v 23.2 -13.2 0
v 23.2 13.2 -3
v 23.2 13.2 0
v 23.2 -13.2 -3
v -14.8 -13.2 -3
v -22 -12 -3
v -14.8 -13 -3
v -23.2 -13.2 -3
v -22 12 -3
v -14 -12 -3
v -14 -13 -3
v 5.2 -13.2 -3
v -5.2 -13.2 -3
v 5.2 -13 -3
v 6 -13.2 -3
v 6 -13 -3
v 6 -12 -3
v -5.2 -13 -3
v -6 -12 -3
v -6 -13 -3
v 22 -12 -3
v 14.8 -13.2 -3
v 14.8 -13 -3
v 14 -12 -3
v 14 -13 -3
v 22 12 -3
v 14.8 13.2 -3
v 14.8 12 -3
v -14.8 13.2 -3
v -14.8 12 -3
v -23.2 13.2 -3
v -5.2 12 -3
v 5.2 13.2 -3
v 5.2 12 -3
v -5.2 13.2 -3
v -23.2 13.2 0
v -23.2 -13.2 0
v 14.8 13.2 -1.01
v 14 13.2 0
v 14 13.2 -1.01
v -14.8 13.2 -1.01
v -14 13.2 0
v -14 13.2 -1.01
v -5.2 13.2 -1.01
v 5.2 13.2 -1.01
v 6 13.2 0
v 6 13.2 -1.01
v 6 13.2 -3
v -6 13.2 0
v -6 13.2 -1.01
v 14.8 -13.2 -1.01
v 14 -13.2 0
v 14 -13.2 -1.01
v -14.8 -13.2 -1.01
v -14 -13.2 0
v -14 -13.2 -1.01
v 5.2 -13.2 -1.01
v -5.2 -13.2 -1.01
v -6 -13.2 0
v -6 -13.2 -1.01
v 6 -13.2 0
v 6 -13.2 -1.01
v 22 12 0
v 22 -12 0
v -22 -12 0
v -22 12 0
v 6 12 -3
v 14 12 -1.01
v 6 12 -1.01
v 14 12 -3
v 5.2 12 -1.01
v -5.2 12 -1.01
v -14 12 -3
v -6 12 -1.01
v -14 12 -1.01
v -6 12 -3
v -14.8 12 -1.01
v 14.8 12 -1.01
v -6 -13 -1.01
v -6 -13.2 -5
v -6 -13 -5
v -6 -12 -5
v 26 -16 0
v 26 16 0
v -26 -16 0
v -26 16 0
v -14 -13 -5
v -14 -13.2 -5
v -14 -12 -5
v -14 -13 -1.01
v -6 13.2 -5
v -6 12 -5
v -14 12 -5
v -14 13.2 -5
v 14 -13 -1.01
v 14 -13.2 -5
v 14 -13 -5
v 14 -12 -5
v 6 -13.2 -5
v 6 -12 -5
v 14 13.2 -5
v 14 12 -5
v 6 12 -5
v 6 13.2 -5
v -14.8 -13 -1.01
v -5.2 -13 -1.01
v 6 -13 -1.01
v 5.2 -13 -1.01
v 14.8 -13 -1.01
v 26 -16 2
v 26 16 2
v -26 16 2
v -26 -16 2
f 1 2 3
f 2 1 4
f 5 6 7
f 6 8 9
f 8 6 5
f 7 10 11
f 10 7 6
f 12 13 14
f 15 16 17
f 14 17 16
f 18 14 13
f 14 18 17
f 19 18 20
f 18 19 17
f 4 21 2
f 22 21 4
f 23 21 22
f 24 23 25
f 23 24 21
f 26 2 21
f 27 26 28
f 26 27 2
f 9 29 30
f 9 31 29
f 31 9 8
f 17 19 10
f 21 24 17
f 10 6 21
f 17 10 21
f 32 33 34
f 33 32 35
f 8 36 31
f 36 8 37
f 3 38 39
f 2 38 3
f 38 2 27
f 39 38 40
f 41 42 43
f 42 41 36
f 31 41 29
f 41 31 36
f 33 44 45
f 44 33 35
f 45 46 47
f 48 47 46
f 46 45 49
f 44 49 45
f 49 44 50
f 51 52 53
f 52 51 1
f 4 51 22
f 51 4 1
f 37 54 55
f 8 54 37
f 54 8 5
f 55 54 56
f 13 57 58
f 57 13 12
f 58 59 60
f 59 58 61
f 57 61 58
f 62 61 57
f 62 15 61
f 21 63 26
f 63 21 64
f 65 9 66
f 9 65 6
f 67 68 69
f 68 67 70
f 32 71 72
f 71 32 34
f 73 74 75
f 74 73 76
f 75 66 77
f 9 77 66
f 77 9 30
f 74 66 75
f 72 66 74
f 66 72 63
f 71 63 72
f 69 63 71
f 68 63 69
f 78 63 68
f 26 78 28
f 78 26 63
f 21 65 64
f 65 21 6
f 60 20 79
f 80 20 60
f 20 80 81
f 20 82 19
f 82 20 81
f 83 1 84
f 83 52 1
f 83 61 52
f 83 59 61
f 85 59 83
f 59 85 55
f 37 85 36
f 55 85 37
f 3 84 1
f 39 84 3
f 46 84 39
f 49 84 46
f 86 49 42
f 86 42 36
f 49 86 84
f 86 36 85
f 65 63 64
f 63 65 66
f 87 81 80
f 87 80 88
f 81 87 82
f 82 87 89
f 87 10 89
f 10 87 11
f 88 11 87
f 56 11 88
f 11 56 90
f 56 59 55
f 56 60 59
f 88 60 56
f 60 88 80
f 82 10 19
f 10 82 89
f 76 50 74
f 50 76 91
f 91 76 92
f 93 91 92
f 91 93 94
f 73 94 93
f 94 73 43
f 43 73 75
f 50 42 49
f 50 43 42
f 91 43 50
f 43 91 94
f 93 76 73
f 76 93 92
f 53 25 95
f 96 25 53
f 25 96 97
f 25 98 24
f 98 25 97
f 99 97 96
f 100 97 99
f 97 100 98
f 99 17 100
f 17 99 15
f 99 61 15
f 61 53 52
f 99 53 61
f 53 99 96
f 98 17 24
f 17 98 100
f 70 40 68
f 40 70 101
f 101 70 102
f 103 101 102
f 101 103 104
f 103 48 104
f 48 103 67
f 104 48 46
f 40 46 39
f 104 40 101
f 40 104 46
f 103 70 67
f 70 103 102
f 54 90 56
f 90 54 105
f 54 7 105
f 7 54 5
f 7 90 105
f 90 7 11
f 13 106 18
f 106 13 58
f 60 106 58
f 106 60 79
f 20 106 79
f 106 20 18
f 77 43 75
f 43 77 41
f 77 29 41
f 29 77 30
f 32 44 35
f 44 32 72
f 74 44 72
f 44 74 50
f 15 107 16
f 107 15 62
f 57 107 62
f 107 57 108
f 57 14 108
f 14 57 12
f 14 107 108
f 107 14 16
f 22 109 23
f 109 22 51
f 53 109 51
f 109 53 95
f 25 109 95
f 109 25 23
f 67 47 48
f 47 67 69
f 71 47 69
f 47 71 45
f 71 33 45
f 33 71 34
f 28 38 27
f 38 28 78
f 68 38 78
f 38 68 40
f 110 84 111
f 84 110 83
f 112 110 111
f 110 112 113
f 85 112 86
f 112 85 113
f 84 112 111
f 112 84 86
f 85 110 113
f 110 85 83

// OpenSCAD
// Snap-fit lid for 50x30 box, 1.5 mm walls (inner 47x27), PETG, FDM.
// Assumptions: box has a small internal catch groove/ledge ~3 mm below top edge
// (box top edge = lid underside, z=0). Lid prints top-down-flat (plate on bed, z up).
plate_x = 52; plate_y = 32; plate_t = 2;   // 1 mm overhang per side
clr = 0.3;                                 // clearance per side to inner wall
rim_x = 47 - 2*clr; rim_y = 27 - 2*clr;    // 46.4 x 26.4
rim_w = 1.2; rim_d = 3;                    // rim wall (3 perimeters @0.4) & depth
arm_len = 5;                               // hook arm length below plate underside
barb = 0.6;                                // barb protrusion (interference w/ clearance)
hook_w = 8; hook_x = 10;                   // hook width, offset from center
slot = 0.8;

module barb2d() { // profile in (y,z), y outward from rim outer face
    polygon([[0,-3],[barb,-3],[barb,-3.4],[0,-4.4]]);
}
union() {
    translate([-plate_x/2,-plate_y/2,0]) cube([plate_x,plate_y,plate_t]);
    difference() {
        union() {
            // rim
            translate([0,0,-rim_d/2+0.01]) difference() {
                cube([rim_x,rim_y,rim_d+0.02],center=true);
                cube([rim_x-2*rim_w,rim_y-2*rim_w,rim_d+1],center=true);
            }
            // hook arms + barbs on both long sides
            for (sx=[-1,1]) for (sy=[-1,1])
                translate([sx*hook_x,sy*rim_y/2,0]) mirror([0,sy<0?1:0,0]) {
                    translate([-hook_w/2,-rim_w,-arm_len]) cube([hook_w,rim_w,arm_len]);
                    translate([hook_w/2,0,0]) rotate([90,0,-90]) linear_extrude(hook_w) translate([0,0]) barb2d();
                }
        }
        // flex slots either side of each arm
        for (sx=[-1,1]) for (sy=[-1,1]) for (e=[-1,1])
            translate([sx*hook_x+e*(hook_w/2+slot/2)-slot/2, sy*rim_y/2-rim_w-0.2, -arm_len-0.01])
                cube([slot,rim_w+0.4,arm_len-1.0]);
    }
}
